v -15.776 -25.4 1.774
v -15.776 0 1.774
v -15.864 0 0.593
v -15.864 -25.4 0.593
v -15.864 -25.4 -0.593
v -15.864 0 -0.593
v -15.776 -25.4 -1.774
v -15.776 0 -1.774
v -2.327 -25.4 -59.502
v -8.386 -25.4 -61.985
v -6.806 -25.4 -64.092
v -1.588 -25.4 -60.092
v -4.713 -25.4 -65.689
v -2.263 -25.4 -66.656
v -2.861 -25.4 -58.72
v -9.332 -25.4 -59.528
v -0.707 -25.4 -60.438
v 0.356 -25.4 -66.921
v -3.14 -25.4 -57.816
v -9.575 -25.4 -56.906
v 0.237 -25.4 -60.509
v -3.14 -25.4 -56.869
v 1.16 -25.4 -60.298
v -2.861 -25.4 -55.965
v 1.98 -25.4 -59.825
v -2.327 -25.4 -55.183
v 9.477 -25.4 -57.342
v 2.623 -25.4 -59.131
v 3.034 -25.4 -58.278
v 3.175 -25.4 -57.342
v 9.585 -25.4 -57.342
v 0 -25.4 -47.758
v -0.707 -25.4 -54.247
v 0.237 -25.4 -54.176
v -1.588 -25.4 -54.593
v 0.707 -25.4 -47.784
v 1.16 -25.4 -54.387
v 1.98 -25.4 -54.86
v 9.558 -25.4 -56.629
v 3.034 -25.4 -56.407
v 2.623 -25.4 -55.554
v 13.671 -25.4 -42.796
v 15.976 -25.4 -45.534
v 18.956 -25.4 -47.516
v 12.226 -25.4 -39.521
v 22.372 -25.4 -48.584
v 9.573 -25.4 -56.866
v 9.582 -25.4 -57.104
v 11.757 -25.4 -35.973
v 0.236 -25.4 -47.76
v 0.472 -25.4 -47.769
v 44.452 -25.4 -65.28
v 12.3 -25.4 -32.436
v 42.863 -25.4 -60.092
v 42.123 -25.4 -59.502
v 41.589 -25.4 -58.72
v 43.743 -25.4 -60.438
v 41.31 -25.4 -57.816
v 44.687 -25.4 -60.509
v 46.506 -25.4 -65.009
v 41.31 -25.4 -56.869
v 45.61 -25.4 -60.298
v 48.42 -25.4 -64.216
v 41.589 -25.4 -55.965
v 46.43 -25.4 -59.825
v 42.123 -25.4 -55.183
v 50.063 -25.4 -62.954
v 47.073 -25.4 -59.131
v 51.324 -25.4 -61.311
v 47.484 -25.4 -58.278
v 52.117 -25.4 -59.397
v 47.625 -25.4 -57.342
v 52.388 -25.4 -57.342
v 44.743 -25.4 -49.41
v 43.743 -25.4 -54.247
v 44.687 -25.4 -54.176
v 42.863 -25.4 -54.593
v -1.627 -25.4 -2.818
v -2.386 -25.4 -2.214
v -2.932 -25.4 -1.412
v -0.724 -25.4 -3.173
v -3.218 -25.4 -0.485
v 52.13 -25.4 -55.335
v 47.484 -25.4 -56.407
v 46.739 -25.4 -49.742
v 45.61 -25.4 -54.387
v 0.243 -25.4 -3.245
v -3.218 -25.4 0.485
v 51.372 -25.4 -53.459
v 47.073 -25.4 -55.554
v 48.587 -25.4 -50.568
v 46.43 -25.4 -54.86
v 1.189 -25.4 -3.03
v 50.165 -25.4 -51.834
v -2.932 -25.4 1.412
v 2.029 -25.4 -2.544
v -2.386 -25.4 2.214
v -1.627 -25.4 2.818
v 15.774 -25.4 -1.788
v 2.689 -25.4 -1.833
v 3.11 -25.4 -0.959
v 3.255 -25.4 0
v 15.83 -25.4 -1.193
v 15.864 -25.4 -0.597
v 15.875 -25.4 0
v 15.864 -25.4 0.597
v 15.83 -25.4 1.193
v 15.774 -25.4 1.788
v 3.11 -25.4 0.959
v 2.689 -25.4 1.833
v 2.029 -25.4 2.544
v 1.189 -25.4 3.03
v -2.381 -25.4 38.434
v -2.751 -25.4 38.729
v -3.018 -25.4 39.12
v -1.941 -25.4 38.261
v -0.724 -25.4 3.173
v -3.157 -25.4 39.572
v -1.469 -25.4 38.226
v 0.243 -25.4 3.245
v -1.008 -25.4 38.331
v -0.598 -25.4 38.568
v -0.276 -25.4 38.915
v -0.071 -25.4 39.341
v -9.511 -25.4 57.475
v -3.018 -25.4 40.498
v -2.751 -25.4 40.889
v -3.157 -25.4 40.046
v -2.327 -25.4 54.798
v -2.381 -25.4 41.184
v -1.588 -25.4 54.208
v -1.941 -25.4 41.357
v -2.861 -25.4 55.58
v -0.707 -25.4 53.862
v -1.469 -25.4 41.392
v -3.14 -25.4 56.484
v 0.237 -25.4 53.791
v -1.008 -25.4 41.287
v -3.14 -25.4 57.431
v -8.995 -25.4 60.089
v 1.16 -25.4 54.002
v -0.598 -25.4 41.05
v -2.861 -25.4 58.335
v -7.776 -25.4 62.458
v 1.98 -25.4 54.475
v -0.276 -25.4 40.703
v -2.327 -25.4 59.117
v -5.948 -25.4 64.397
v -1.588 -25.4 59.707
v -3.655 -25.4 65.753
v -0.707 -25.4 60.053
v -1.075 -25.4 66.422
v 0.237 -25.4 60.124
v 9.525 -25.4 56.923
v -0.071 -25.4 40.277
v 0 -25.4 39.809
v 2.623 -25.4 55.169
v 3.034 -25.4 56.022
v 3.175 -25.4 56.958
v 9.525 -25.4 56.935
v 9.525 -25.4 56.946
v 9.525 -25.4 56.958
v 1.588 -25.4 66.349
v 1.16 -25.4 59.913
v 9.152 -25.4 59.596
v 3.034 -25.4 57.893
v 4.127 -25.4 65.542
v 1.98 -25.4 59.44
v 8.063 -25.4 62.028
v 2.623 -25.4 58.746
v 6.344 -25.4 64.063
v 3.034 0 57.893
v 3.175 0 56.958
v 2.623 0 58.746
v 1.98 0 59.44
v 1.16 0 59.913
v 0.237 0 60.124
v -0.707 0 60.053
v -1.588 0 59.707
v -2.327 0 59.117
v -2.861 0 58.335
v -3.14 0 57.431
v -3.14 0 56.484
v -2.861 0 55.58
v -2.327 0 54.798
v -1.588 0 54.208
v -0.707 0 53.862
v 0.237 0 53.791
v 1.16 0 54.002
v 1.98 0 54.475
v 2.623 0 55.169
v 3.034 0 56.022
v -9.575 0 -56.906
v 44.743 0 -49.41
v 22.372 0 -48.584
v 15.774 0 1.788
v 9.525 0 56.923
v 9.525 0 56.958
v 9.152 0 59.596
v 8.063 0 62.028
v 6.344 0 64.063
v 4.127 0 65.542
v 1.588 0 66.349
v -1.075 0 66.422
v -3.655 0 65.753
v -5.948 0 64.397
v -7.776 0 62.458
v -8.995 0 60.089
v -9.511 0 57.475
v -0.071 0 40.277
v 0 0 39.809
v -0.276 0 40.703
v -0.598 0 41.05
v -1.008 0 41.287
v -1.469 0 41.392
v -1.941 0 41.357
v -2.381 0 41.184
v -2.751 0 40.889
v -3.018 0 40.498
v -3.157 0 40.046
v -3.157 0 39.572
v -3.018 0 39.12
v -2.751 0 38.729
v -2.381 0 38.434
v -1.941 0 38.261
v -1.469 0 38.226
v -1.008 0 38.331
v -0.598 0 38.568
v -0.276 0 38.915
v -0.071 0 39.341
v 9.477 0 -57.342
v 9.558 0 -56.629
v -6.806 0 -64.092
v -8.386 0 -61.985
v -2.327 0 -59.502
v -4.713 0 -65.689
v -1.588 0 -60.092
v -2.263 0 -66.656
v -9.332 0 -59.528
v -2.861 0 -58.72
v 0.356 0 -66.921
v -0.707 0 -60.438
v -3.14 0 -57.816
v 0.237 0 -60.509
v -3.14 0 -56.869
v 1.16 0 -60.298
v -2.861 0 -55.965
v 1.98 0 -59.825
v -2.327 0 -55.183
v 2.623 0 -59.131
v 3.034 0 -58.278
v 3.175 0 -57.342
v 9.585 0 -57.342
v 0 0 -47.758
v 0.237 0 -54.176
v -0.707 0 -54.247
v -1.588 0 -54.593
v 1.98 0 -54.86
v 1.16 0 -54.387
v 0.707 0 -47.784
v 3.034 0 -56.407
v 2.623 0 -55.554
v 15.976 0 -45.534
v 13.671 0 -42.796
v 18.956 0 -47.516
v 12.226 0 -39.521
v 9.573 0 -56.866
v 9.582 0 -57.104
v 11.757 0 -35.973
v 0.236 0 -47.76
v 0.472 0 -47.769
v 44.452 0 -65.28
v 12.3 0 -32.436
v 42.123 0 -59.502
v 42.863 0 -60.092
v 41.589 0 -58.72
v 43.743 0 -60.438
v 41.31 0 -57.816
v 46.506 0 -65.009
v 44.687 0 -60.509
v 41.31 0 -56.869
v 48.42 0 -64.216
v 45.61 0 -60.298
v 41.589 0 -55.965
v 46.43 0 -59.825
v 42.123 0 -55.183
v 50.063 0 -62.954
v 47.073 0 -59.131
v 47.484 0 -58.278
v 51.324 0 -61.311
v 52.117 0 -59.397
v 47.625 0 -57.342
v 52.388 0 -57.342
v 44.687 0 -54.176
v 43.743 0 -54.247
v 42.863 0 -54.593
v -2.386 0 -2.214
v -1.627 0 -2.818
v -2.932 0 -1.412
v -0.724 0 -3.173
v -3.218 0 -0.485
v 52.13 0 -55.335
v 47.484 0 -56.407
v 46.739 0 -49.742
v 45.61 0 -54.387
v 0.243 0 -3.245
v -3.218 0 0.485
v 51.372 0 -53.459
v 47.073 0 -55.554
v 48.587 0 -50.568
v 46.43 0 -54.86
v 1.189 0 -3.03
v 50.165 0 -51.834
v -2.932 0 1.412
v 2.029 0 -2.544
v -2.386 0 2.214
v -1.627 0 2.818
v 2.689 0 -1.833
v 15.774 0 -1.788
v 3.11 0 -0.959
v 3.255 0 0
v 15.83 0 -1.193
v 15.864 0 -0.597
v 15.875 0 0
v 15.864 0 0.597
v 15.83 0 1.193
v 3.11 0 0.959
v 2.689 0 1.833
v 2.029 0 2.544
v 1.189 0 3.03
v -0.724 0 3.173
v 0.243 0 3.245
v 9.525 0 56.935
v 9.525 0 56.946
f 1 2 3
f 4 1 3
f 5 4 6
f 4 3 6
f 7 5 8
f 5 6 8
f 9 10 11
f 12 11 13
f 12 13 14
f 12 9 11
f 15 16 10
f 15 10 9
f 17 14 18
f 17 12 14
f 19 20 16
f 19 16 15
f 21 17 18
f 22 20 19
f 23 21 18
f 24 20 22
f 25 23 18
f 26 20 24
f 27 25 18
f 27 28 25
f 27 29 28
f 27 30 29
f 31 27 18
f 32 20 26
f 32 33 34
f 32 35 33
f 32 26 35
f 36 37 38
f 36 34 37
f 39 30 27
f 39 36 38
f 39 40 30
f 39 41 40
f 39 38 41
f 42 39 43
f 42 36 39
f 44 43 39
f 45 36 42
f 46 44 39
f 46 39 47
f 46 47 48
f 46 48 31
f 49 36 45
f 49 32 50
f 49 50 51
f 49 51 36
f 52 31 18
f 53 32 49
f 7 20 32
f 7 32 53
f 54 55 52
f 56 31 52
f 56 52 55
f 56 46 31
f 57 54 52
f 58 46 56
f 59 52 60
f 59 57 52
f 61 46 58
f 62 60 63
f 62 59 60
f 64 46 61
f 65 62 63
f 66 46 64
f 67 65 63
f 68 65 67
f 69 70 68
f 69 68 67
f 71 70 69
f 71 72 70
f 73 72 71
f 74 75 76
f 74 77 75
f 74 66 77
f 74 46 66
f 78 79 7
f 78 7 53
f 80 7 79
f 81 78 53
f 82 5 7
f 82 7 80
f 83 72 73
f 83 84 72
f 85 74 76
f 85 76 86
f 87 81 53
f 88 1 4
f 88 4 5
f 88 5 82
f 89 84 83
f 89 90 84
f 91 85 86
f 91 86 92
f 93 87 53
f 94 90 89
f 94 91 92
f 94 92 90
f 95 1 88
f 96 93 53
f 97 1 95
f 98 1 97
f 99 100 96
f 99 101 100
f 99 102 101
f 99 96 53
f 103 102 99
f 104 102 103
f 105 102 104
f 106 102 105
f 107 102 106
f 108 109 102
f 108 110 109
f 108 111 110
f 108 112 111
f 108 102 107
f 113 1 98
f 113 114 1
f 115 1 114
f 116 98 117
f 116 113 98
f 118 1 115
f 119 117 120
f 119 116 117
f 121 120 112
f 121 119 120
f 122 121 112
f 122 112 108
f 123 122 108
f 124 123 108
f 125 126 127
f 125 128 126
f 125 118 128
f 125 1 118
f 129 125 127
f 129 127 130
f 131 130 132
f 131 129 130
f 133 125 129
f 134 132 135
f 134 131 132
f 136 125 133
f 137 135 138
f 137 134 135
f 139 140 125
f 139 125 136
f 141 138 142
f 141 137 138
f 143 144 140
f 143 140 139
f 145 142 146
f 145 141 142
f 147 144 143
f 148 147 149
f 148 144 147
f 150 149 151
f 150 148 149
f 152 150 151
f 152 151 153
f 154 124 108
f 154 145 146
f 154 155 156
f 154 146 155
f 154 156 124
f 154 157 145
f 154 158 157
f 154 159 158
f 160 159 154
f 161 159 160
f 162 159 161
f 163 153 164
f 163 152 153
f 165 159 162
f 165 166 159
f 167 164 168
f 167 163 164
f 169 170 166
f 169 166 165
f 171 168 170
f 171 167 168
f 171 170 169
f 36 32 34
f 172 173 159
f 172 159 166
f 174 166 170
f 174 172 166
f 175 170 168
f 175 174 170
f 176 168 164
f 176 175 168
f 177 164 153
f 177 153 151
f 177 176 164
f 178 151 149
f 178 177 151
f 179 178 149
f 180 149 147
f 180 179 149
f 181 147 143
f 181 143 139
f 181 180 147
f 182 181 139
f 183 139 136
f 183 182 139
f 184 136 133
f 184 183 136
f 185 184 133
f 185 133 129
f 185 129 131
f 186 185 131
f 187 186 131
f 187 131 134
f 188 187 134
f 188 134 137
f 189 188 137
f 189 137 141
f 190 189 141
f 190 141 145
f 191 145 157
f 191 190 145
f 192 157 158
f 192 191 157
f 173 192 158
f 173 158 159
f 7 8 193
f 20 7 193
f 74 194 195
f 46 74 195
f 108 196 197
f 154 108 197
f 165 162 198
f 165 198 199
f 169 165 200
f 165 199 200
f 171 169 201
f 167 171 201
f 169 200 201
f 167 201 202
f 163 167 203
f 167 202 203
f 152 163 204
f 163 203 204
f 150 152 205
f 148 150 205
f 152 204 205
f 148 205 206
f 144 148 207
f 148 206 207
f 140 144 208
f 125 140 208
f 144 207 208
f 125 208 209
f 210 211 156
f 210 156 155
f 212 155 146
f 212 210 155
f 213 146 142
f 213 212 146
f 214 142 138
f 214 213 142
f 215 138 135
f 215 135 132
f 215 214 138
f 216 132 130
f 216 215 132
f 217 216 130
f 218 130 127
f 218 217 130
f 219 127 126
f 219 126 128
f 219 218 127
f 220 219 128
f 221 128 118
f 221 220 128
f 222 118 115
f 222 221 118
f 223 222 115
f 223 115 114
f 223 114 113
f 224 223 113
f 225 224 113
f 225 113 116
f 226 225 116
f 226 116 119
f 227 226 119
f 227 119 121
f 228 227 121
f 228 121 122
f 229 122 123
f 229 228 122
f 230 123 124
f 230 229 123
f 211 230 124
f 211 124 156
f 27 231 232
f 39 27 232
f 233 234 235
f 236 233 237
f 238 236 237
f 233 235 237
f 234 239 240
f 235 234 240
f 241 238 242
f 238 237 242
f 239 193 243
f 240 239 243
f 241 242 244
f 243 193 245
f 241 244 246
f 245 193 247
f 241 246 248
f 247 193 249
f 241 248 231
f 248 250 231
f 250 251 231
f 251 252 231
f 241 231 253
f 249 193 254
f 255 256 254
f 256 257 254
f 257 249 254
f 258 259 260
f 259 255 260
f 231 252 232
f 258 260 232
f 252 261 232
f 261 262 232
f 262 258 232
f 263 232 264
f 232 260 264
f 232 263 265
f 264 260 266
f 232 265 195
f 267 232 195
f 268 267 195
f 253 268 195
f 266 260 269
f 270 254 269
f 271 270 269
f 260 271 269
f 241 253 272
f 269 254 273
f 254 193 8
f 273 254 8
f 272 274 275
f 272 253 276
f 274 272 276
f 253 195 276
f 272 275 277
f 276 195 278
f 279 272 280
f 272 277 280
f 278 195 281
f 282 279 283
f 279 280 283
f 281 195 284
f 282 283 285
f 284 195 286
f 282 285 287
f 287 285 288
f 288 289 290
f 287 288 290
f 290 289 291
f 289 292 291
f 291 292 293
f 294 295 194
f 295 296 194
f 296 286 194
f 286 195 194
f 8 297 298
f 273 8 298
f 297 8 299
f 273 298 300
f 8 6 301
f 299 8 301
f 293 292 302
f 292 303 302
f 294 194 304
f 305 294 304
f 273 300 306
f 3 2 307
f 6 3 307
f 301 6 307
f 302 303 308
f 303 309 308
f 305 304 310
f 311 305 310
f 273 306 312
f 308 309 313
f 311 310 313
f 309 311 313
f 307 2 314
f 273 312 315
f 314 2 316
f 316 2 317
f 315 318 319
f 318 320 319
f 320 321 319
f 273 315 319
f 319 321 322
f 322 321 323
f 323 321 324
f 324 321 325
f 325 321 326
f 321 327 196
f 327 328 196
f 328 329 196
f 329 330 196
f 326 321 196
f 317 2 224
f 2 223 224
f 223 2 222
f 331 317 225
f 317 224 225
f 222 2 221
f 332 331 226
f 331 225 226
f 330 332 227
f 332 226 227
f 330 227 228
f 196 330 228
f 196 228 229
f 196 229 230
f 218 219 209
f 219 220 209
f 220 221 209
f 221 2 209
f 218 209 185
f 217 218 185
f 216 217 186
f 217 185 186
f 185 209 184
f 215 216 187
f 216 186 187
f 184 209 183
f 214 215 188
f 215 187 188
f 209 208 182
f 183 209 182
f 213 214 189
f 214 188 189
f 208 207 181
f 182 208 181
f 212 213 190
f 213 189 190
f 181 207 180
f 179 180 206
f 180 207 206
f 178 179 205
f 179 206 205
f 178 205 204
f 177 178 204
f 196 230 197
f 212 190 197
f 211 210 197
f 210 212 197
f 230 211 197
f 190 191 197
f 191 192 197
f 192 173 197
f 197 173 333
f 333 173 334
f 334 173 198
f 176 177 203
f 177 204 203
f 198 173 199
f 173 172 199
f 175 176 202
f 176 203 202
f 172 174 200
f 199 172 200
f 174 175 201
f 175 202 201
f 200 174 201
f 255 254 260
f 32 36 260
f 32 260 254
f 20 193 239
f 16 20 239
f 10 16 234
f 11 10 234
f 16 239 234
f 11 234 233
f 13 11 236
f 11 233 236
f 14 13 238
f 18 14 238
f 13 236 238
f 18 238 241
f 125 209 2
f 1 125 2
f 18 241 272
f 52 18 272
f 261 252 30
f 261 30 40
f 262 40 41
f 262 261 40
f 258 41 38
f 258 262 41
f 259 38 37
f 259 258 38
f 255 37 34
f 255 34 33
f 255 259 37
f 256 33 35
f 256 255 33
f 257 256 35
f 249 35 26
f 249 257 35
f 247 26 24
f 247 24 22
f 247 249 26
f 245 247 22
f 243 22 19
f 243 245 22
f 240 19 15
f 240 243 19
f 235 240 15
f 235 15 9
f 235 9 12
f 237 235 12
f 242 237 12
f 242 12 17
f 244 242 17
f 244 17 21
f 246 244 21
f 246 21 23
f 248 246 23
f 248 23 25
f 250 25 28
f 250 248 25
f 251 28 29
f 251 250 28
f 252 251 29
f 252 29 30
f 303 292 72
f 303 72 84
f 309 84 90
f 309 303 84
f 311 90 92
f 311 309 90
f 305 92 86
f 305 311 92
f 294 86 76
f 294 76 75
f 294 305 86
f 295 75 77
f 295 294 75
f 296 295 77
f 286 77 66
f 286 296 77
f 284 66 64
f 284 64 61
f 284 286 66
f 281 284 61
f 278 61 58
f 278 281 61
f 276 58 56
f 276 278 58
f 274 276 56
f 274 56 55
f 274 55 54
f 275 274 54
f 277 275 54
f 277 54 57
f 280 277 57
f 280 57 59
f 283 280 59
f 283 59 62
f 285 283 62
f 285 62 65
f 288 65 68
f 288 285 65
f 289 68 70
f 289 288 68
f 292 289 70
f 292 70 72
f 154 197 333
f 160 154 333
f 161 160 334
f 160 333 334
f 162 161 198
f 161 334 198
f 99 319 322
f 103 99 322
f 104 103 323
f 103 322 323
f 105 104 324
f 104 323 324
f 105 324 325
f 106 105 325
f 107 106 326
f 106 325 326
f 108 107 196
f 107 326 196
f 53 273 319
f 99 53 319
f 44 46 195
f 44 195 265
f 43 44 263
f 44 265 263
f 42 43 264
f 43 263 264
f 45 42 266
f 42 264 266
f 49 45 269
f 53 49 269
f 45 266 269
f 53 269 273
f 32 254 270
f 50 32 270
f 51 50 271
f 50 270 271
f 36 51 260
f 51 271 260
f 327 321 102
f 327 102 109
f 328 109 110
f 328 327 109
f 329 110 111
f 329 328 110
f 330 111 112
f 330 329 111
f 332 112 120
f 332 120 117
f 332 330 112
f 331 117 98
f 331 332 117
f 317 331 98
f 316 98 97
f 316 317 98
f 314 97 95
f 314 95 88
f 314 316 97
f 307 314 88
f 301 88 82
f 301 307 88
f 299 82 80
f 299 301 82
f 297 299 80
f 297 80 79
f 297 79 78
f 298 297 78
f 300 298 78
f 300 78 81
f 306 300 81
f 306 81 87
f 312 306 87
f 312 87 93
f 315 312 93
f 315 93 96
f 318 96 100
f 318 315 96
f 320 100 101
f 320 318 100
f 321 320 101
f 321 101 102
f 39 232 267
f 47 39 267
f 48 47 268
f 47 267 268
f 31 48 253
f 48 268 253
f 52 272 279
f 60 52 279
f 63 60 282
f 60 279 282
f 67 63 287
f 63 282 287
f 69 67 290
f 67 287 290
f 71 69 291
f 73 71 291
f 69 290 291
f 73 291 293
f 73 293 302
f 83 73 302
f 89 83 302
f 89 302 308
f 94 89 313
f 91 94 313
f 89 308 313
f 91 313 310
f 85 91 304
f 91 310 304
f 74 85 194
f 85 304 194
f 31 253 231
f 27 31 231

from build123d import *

# Parameters (mm, degrees)
F0_R     = 1.5875
F0_R_2   = 3.254514
F0_R_3   = 3.175
F1_DEPTH = 25.4


with BuildPart() as f1:
    # F0 (on Front) → F1 (new body)
    with BuildSketch(Plane.XZ):
        with BuildLine():
            ThreePointArc((9.524938, 56.923091), (-0.27613, 47.436536), (-9.510924, 57.475173))
            Line((-9.510924, 57.475173), (-15.775539, 1.774256))
            ThreePointArc((-15.775539, 1.774256), (-0.006833, 15.874999), (15.774006, 1.787837))
            Line((15.774006, 1.787837), (9.524938, 56.923091))
        make_face()
        with Locations((-1.5875, 39.808989)):
            Circle(F0_R, mode=Mode.SUBTRACT)
        with BuildLine():
            ThreePointArc((15.774006, 1.787837), (-0.006833, 15.874999), (-15.775539, 1.774256))
            ThreePointArc((-15.775539, 1.774256), (-15.875, 0), (-15.775539, -1.774256))
            ThreePointArc((-15.775539, -1.774256), (-0.006834, -15.874999), (15.774006, -1.787837))
            ThreePointArc((15.774006, -1.787837), (15.849731, -0.895344), (15.875, 0))
            ThreePointArc((15.875, 0), (15.849731, 0.895343), (15.774006, 1.787837))
        make_face()
        Circle(F0_R_2, mode=Mode.SUBTRACT)
        with BuildLine():
            ThreePointArc((15.774006, -1.787837), (-0.006834, -15.874999), (-15.775539, -1.774256))
            Line((-15.775539, -1.774256), (-9.574969, -56.905723))
            ThreePointArc((-9.574969, -56.905723), (-6.621351, -50.412213), (0, -47.757548))
            ThreePointArc((0, -47.757548), (0.353832, -47.764081), (0.707181, -47.783671))
            ThreePointArc((0.707181, -47.783671), (6.775215, -50.562558), (9.558309, -56.628662))
            ThreePointArc((9.558309, -56.628662), (9.578269, -56.98532), (9.584925, -57.342473))
            ThreePointArc((9.584925, -57.342473), (6.902424, -63.992835), (0.356407, -66.920769))
            Line((0.356407, -66.920769), (44.452102, -65.279972))
            ThreePointArc((44.452102, -65.279972), (36.513833, -57.196991), (44.743016, -49.410383))
            Line((44.743016, -49.410383), (22.371508, -48.583965))
            ThreePointArc((22.371508, -48.583965), (13.670923, -42.795517), (12.300367, -32.435599))
            Line((12.300367, -32.435599), (15.774006, -1.787837))
        make_face()
        with BuildLine():
            ThreePointArc((44.743016, -49.410383), (36.513833, -57.196991), (44.452102, -65.279972))
            ThreePointArc((44.452102, -65.279972), (50.063403, -62.954389), (52.3875, -57.342473))
            ThreePointArc((52.3875, -57.342473), (50.165318, -51.834384), (44.743016, -49.410383))
        make_face()
        with Locations((44.45, -57.342473)):
            Circle(F0_R_3, mode=Mode.SUBTRACT)
        with BuildLine():
            ThreePointArc((0, -47.757548), (-6.621351, -50.412213), (-9.574969, -56.905723))
            ThreePointArc((-9.574969, -56.905723), (-6.805935, -64.091549), (0.356407, -66.920769))
            ThreePointArc((0.356407, -66.920769), (6.902424, -63.992835), (9.584925, -57.342473))
            Line((9.584925, -57.342473), (9.477405, -57.342473))
            Line((9.477405, -57.342473), (9.558309, -56.628662))
            ThreePointArc((9.558309, -56.628662), (6.775215, -50.562558), (0.707181, -47.783671))
            Line((0.707181, -47.783671), (0, -47.757548))
        make_face()
        with Locations((0, -57.342473)):
            Circle(F0_R_3, mode=Mode.SUBTRACT)
        with BuildLine():
            ThreePointArc((9.524938, 56.923091), (9.524984, 56.940312), (9.525, 56.957532))
            ThreePointArc((9.525, 56.957532), (0.258916, 66.479013), (-9.510924, 57.475173))
            ThreePointArc((-9.510924, 57.475173), (-0.27613, 47.436536), (9.524938, 56.923091))
        make_face()
        with Locations((0, 56.957532)):
            Circle(F0_R_3, mode=Mode.SUBTRACT)
    extrude(amount=F1_DEPTH)


solid = f1.part
